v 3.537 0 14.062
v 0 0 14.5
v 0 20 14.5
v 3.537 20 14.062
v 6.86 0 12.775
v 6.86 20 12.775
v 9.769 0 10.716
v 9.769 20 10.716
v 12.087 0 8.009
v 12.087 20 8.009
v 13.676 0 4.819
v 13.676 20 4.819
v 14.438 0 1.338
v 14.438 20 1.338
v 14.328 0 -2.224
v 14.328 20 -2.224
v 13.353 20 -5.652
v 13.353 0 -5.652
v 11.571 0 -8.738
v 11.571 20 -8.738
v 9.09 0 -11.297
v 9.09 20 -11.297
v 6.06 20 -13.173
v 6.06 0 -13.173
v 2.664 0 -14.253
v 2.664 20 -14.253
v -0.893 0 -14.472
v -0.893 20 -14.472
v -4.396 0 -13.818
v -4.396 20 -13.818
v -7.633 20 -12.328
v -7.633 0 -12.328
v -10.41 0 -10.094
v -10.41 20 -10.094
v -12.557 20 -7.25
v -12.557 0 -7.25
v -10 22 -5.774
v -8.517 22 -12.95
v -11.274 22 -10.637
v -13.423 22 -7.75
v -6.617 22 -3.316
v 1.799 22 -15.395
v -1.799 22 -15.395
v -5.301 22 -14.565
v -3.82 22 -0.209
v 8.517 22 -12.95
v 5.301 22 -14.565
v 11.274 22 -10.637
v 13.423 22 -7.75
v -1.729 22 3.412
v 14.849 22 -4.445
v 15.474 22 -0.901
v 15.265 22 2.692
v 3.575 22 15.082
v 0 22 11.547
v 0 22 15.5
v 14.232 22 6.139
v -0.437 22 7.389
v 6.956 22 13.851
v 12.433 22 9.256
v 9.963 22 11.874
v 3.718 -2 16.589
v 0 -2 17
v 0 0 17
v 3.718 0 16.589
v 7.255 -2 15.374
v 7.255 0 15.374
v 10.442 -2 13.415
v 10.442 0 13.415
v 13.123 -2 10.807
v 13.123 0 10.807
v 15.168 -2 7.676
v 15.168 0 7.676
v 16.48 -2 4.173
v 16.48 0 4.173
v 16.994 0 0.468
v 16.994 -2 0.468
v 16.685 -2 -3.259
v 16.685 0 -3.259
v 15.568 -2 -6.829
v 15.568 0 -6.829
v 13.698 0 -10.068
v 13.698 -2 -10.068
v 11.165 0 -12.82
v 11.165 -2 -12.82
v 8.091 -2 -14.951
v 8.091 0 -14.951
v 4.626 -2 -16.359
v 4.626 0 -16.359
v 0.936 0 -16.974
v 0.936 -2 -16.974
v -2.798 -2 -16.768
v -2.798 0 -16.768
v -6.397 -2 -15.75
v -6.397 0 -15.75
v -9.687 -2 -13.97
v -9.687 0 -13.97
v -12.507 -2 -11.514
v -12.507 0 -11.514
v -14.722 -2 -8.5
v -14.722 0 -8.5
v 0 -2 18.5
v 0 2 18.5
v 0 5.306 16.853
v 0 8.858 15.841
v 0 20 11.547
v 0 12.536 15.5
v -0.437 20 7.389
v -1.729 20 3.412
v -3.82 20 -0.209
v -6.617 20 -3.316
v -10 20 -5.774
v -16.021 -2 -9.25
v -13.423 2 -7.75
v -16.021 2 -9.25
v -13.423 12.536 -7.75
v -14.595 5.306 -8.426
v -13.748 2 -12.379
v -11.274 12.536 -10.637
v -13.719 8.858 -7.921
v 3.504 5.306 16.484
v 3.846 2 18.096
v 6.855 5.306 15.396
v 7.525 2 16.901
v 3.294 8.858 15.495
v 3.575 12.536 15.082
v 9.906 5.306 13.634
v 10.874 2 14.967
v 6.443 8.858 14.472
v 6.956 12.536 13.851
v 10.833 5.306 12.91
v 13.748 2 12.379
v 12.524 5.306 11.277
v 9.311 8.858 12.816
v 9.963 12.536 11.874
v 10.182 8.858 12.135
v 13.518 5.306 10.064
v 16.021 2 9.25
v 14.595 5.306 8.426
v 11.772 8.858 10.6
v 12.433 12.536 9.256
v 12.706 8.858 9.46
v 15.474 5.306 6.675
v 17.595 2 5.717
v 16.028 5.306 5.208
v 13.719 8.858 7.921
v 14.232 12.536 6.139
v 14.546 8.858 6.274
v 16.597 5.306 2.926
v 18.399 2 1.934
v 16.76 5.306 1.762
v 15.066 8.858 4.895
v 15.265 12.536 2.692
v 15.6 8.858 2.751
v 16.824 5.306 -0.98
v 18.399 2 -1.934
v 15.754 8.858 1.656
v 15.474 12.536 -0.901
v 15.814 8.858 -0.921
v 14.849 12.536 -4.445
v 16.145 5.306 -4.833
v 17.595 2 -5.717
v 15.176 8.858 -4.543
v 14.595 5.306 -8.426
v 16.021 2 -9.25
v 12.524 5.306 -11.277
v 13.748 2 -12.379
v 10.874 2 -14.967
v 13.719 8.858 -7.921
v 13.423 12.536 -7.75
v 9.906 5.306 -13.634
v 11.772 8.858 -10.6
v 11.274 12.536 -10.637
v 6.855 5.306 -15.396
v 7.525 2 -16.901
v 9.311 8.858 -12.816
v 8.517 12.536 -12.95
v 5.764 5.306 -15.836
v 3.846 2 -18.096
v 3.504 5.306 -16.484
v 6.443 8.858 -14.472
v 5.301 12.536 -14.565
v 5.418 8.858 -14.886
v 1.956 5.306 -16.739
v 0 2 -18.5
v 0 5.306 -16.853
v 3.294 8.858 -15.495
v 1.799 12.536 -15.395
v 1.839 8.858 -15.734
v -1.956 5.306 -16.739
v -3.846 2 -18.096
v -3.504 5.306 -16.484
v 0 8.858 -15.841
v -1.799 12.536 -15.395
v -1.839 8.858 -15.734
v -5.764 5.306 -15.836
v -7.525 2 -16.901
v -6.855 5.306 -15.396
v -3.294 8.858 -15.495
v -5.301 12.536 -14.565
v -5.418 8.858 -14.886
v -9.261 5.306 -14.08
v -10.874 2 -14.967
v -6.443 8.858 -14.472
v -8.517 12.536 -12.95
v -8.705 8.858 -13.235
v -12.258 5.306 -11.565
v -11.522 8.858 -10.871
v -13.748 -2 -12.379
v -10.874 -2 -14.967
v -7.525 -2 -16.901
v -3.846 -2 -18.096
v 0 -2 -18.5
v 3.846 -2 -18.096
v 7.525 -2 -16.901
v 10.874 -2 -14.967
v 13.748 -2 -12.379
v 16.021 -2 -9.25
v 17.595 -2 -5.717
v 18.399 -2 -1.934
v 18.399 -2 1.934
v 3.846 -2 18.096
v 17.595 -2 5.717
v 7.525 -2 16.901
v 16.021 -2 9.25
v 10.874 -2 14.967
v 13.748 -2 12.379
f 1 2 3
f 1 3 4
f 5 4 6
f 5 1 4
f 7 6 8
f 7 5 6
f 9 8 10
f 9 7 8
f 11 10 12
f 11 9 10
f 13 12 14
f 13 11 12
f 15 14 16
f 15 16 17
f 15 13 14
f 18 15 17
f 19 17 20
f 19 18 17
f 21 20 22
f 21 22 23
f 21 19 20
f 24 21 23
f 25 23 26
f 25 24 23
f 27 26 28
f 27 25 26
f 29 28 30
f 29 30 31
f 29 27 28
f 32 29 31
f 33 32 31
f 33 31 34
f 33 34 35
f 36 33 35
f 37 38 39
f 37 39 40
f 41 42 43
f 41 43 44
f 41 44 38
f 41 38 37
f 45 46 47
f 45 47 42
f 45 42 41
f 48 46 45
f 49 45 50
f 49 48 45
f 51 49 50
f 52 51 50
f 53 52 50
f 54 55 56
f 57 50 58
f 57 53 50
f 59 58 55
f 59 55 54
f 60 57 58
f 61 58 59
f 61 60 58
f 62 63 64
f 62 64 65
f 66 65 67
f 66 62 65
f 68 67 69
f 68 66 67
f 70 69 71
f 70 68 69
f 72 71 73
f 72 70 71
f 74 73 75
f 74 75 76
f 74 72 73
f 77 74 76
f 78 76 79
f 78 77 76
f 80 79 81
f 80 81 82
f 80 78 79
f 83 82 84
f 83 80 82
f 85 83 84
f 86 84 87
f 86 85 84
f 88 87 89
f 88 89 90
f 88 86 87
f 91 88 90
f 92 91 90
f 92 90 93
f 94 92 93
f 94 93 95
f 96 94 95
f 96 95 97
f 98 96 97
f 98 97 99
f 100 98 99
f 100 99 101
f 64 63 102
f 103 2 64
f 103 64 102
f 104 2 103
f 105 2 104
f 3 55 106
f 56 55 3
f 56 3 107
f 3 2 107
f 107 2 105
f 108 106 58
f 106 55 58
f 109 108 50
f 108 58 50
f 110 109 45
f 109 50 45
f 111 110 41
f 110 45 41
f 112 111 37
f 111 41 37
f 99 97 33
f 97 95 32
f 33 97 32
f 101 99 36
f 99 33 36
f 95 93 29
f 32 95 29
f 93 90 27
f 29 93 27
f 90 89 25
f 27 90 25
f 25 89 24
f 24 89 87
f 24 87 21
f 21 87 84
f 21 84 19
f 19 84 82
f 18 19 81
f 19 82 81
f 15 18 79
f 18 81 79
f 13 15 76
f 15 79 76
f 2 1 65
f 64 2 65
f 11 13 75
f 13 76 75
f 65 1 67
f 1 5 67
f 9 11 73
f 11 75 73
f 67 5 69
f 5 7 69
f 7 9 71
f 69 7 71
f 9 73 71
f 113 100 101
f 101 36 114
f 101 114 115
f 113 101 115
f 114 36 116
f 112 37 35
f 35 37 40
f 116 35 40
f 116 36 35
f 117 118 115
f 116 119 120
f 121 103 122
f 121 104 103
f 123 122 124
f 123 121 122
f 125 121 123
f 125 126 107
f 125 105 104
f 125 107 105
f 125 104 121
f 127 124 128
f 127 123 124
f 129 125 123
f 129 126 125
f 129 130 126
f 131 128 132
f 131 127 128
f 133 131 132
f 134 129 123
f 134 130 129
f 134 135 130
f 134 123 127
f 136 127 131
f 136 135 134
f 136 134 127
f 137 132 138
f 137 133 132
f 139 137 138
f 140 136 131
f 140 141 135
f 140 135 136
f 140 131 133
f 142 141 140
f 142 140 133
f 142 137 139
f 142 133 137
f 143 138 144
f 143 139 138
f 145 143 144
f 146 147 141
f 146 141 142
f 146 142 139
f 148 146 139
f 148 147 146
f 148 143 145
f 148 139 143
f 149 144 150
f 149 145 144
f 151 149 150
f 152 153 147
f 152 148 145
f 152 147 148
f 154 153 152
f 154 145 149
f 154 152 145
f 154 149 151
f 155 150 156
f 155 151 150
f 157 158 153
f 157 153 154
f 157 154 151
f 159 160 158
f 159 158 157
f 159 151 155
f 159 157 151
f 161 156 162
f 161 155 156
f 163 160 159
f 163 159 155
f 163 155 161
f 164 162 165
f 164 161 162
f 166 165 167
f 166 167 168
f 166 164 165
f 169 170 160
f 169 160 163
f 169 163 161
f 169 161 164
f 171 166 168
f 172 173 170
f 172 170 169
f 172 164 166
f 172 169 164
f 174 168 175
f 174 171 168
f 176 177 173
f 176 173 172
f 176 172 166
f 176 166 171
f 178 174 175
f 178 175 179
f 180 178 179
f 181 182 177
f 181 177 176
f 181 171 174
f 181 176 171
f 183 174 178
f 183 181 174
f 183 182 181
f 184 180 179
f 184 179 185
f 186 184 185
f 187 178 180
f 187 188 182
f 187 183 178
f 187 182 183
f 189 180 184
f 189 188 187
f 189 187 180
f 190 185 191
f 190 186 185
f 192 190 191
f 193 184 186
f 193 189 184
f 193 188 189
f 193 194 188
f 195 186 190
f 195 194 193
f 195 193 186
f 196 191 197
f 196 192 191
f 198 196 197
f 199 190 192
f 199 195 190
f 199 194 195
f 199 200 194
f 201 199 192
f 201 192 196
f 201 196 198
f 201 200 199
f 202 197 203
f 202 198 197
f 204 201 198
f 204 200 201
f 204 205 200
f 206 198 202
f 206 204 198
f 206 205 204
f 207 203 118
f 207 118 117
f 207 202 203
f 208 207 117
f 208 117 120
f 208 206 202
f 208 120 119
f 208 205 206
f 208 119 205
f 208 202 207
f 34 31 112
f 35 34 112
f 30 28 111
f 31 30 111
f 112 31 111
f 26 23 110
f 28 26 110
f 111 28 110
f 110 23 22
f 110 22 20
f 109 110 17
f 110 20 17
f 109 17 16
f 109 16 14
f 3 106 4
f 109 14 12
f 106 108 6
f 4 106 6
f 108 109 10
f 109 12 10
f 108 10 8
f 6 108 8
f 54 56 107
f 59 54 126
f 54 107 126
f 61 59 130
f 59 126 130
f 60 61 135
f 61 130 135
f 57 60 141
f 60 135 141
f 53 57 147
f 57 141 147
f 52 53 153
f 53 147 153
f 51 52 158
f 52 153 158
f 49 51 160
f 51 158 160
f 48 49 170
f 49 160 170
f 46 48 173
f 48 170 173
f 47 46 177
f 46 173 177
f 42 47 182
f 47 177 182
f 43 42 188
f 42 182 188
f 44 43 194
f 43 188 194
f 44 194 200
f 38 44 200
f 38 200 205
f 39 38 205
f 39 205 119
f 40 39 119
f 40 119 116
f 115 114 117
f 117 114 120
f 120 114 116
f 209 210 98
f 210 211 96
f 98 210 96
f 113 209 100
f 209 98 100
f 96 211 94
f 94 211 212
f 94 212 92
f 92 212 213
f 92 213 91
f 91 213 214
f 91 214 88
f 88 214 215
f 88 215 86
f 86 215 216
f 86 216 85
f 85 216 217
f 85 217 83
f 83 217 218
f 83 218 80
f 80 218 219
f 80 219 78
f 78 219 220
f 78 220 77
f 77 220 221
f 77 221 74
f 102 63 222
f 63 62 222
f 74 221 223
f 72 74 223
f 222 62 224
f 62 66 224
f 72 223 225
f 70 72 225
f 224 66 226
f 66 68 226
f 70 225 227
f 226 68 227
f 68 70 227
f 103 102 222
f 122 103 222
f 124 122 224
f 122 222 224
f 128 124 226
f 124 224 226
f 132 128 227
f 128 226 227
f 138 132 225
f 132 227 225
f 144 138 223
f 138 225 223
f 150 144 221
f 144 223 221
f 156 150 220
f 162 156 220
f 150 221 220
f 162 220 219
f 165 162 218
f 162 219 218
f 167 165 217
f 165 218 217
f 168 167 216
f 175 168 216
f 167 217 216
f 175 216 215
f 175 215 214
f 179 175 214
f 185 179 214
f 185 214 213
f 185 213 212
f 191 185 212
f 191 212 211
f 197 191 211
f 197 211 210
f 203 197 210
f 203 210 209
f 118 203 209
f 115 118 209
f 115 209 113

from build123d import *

# Parameters (mm, degrees)
SKETCH1_R           = 18.5
SKETCH1_R_2         = 14.5
BOSS_EXTRUDE2_DEPTH = 2
BOSS_EXTRUDE3_START = -2
SKETCH1_4_R         = 18.5
SKETCH1_4_R_2       = 17
BOSS_EXTRUDE3_DEPTH = 2
SKETCH1_5_R         = 15.5
SKETCH1_5_R_2       = 14.5
BOSS_EXTRUDE4_DEPTH = 20
BOSS_EXTRUDE5_START = 20
SKETCH1_6_R         = 15.5
BOSS_EXTRUDE5_DEPTH = 2
SKETCH2_W           = 20
SKETCH2_H           = 20
CUT_EXTRUDE3_DEPTH  = 31
FILLET2_R           = 20
FILLET3_ANGLE       = 240


with BuildPart() as part:
    # Sketch1 → Boss-Extrude2 (new body)
    with BuildSketch(Plane(origin=(0, 0, 0), x_dir=(1, 0, 0), z_dir=(0, 1, 0))):
        with Locations(Location((0, 0, 0), (0, 0, 270))):
            Circle(SKETCH1_R)
        with Locations(Location((0, 0, 0), (0, 0, 270))):
            Circle(SKETCH1_R_2, mode=Mode.SUBTRACT)
    extrude(amount=BOSS_EXTRUDE2_DEPTH)

    # Sketch1<4> → Boss-Extrude3 (add)
    with BuildSketch(Plane(origin=(0, 0, 0), x_dir=(1, 0, 0), z_dir=(0, 1, 0)).offset(BOSS_EXTRUDE3_START)):
        with Locations(Location((0, 0, 0), (0, 0, 270))):
            Circle(SKETCH1_4_R)
        with Locations(Location((0, 0, 0), (0, 0, 270))):
            Circle(SKETCH1_4_R_2, mode=Mode.SUBTRACT)
    extrude(amount=BOSS_EXTRUDE3_DEPTH)

    # Sketch1<5> → Boss-Extrude4 (add)
    with BuildSketch(Plane(origin=(0, 0, 0), x_dir=(1, 0, 0), z_dir=(0, 1, 0))):
        with Locations(Location((0, 0, 0), (0, 0, 270))):
            Circle(SKETCH1_5_R)
        with Locations(Location((0, 0, 0), (0, 0, 270))):
            Circle(SKETCH1_5_R_2, mode=Mode.SUBTRACT)
    extrude(amount=BOSS_EXTRUDE4_DEPTH)

    # Sketch1<6> → Boss-Extrude5 (add)
    with BuildSketch(Plane(origin=(0, 0, 0), x_dir=(1, 0, 0), z_dir=(0, 1, 0)).offset(BOSS_EXTRUDE5_START)):
        with Locations(Location((0, 0, 0), (0, 0, 270))):
            Circle(SKETCH1_6_R)
    extrude(amount=BOSS_EXTRUDE5_DEPTH)

    # Sketch2 → Cut-Extrude3 (cut, symmetric)
    with BuildSketch(Plane(origin=(0, 0, 0), x_dir=(1, 0, 0), z_dir=(0, 1, 0))):
        with Locations((-10, -10)):
            Rectangle(SKETCH2_W, SKETCH2_H)
        Polygon((0, 0), (-20, 11.547005384), (-20, 0), align=None)
    extrude(amount=CUT_EXTRUDE3_DEPTH, both=True, mode=Mode.SUBTRACT)

    # Fillet2
    fillet2_edges = [part.edges().sort_by_distance(p)[0] for p in [
        (0, 21, 0),
    ]]
    fillet(fillet2_edges, radius=FILLET2_R)

    # Fillet3: read off the stored shape, not the designer's step
    # Fillet3 outline → Fillet3 (revolve)
    with BuildSketch(Plane.ZY):
        with BuildLine():
            Line((15.5, 2), (18.5, 2))
            ThreePointArc((18.5, 2), (16.264615938, 7.058428178), (15.5, 12.535653753))
            Line((15.5, 12.535653753), (15.5, 2))
        make_face()
    revolve(axis=Axis((0, 0, 0), (0, 1, 0)), revolution_arc=FILLET3_ANGLE)


solid = part.part
